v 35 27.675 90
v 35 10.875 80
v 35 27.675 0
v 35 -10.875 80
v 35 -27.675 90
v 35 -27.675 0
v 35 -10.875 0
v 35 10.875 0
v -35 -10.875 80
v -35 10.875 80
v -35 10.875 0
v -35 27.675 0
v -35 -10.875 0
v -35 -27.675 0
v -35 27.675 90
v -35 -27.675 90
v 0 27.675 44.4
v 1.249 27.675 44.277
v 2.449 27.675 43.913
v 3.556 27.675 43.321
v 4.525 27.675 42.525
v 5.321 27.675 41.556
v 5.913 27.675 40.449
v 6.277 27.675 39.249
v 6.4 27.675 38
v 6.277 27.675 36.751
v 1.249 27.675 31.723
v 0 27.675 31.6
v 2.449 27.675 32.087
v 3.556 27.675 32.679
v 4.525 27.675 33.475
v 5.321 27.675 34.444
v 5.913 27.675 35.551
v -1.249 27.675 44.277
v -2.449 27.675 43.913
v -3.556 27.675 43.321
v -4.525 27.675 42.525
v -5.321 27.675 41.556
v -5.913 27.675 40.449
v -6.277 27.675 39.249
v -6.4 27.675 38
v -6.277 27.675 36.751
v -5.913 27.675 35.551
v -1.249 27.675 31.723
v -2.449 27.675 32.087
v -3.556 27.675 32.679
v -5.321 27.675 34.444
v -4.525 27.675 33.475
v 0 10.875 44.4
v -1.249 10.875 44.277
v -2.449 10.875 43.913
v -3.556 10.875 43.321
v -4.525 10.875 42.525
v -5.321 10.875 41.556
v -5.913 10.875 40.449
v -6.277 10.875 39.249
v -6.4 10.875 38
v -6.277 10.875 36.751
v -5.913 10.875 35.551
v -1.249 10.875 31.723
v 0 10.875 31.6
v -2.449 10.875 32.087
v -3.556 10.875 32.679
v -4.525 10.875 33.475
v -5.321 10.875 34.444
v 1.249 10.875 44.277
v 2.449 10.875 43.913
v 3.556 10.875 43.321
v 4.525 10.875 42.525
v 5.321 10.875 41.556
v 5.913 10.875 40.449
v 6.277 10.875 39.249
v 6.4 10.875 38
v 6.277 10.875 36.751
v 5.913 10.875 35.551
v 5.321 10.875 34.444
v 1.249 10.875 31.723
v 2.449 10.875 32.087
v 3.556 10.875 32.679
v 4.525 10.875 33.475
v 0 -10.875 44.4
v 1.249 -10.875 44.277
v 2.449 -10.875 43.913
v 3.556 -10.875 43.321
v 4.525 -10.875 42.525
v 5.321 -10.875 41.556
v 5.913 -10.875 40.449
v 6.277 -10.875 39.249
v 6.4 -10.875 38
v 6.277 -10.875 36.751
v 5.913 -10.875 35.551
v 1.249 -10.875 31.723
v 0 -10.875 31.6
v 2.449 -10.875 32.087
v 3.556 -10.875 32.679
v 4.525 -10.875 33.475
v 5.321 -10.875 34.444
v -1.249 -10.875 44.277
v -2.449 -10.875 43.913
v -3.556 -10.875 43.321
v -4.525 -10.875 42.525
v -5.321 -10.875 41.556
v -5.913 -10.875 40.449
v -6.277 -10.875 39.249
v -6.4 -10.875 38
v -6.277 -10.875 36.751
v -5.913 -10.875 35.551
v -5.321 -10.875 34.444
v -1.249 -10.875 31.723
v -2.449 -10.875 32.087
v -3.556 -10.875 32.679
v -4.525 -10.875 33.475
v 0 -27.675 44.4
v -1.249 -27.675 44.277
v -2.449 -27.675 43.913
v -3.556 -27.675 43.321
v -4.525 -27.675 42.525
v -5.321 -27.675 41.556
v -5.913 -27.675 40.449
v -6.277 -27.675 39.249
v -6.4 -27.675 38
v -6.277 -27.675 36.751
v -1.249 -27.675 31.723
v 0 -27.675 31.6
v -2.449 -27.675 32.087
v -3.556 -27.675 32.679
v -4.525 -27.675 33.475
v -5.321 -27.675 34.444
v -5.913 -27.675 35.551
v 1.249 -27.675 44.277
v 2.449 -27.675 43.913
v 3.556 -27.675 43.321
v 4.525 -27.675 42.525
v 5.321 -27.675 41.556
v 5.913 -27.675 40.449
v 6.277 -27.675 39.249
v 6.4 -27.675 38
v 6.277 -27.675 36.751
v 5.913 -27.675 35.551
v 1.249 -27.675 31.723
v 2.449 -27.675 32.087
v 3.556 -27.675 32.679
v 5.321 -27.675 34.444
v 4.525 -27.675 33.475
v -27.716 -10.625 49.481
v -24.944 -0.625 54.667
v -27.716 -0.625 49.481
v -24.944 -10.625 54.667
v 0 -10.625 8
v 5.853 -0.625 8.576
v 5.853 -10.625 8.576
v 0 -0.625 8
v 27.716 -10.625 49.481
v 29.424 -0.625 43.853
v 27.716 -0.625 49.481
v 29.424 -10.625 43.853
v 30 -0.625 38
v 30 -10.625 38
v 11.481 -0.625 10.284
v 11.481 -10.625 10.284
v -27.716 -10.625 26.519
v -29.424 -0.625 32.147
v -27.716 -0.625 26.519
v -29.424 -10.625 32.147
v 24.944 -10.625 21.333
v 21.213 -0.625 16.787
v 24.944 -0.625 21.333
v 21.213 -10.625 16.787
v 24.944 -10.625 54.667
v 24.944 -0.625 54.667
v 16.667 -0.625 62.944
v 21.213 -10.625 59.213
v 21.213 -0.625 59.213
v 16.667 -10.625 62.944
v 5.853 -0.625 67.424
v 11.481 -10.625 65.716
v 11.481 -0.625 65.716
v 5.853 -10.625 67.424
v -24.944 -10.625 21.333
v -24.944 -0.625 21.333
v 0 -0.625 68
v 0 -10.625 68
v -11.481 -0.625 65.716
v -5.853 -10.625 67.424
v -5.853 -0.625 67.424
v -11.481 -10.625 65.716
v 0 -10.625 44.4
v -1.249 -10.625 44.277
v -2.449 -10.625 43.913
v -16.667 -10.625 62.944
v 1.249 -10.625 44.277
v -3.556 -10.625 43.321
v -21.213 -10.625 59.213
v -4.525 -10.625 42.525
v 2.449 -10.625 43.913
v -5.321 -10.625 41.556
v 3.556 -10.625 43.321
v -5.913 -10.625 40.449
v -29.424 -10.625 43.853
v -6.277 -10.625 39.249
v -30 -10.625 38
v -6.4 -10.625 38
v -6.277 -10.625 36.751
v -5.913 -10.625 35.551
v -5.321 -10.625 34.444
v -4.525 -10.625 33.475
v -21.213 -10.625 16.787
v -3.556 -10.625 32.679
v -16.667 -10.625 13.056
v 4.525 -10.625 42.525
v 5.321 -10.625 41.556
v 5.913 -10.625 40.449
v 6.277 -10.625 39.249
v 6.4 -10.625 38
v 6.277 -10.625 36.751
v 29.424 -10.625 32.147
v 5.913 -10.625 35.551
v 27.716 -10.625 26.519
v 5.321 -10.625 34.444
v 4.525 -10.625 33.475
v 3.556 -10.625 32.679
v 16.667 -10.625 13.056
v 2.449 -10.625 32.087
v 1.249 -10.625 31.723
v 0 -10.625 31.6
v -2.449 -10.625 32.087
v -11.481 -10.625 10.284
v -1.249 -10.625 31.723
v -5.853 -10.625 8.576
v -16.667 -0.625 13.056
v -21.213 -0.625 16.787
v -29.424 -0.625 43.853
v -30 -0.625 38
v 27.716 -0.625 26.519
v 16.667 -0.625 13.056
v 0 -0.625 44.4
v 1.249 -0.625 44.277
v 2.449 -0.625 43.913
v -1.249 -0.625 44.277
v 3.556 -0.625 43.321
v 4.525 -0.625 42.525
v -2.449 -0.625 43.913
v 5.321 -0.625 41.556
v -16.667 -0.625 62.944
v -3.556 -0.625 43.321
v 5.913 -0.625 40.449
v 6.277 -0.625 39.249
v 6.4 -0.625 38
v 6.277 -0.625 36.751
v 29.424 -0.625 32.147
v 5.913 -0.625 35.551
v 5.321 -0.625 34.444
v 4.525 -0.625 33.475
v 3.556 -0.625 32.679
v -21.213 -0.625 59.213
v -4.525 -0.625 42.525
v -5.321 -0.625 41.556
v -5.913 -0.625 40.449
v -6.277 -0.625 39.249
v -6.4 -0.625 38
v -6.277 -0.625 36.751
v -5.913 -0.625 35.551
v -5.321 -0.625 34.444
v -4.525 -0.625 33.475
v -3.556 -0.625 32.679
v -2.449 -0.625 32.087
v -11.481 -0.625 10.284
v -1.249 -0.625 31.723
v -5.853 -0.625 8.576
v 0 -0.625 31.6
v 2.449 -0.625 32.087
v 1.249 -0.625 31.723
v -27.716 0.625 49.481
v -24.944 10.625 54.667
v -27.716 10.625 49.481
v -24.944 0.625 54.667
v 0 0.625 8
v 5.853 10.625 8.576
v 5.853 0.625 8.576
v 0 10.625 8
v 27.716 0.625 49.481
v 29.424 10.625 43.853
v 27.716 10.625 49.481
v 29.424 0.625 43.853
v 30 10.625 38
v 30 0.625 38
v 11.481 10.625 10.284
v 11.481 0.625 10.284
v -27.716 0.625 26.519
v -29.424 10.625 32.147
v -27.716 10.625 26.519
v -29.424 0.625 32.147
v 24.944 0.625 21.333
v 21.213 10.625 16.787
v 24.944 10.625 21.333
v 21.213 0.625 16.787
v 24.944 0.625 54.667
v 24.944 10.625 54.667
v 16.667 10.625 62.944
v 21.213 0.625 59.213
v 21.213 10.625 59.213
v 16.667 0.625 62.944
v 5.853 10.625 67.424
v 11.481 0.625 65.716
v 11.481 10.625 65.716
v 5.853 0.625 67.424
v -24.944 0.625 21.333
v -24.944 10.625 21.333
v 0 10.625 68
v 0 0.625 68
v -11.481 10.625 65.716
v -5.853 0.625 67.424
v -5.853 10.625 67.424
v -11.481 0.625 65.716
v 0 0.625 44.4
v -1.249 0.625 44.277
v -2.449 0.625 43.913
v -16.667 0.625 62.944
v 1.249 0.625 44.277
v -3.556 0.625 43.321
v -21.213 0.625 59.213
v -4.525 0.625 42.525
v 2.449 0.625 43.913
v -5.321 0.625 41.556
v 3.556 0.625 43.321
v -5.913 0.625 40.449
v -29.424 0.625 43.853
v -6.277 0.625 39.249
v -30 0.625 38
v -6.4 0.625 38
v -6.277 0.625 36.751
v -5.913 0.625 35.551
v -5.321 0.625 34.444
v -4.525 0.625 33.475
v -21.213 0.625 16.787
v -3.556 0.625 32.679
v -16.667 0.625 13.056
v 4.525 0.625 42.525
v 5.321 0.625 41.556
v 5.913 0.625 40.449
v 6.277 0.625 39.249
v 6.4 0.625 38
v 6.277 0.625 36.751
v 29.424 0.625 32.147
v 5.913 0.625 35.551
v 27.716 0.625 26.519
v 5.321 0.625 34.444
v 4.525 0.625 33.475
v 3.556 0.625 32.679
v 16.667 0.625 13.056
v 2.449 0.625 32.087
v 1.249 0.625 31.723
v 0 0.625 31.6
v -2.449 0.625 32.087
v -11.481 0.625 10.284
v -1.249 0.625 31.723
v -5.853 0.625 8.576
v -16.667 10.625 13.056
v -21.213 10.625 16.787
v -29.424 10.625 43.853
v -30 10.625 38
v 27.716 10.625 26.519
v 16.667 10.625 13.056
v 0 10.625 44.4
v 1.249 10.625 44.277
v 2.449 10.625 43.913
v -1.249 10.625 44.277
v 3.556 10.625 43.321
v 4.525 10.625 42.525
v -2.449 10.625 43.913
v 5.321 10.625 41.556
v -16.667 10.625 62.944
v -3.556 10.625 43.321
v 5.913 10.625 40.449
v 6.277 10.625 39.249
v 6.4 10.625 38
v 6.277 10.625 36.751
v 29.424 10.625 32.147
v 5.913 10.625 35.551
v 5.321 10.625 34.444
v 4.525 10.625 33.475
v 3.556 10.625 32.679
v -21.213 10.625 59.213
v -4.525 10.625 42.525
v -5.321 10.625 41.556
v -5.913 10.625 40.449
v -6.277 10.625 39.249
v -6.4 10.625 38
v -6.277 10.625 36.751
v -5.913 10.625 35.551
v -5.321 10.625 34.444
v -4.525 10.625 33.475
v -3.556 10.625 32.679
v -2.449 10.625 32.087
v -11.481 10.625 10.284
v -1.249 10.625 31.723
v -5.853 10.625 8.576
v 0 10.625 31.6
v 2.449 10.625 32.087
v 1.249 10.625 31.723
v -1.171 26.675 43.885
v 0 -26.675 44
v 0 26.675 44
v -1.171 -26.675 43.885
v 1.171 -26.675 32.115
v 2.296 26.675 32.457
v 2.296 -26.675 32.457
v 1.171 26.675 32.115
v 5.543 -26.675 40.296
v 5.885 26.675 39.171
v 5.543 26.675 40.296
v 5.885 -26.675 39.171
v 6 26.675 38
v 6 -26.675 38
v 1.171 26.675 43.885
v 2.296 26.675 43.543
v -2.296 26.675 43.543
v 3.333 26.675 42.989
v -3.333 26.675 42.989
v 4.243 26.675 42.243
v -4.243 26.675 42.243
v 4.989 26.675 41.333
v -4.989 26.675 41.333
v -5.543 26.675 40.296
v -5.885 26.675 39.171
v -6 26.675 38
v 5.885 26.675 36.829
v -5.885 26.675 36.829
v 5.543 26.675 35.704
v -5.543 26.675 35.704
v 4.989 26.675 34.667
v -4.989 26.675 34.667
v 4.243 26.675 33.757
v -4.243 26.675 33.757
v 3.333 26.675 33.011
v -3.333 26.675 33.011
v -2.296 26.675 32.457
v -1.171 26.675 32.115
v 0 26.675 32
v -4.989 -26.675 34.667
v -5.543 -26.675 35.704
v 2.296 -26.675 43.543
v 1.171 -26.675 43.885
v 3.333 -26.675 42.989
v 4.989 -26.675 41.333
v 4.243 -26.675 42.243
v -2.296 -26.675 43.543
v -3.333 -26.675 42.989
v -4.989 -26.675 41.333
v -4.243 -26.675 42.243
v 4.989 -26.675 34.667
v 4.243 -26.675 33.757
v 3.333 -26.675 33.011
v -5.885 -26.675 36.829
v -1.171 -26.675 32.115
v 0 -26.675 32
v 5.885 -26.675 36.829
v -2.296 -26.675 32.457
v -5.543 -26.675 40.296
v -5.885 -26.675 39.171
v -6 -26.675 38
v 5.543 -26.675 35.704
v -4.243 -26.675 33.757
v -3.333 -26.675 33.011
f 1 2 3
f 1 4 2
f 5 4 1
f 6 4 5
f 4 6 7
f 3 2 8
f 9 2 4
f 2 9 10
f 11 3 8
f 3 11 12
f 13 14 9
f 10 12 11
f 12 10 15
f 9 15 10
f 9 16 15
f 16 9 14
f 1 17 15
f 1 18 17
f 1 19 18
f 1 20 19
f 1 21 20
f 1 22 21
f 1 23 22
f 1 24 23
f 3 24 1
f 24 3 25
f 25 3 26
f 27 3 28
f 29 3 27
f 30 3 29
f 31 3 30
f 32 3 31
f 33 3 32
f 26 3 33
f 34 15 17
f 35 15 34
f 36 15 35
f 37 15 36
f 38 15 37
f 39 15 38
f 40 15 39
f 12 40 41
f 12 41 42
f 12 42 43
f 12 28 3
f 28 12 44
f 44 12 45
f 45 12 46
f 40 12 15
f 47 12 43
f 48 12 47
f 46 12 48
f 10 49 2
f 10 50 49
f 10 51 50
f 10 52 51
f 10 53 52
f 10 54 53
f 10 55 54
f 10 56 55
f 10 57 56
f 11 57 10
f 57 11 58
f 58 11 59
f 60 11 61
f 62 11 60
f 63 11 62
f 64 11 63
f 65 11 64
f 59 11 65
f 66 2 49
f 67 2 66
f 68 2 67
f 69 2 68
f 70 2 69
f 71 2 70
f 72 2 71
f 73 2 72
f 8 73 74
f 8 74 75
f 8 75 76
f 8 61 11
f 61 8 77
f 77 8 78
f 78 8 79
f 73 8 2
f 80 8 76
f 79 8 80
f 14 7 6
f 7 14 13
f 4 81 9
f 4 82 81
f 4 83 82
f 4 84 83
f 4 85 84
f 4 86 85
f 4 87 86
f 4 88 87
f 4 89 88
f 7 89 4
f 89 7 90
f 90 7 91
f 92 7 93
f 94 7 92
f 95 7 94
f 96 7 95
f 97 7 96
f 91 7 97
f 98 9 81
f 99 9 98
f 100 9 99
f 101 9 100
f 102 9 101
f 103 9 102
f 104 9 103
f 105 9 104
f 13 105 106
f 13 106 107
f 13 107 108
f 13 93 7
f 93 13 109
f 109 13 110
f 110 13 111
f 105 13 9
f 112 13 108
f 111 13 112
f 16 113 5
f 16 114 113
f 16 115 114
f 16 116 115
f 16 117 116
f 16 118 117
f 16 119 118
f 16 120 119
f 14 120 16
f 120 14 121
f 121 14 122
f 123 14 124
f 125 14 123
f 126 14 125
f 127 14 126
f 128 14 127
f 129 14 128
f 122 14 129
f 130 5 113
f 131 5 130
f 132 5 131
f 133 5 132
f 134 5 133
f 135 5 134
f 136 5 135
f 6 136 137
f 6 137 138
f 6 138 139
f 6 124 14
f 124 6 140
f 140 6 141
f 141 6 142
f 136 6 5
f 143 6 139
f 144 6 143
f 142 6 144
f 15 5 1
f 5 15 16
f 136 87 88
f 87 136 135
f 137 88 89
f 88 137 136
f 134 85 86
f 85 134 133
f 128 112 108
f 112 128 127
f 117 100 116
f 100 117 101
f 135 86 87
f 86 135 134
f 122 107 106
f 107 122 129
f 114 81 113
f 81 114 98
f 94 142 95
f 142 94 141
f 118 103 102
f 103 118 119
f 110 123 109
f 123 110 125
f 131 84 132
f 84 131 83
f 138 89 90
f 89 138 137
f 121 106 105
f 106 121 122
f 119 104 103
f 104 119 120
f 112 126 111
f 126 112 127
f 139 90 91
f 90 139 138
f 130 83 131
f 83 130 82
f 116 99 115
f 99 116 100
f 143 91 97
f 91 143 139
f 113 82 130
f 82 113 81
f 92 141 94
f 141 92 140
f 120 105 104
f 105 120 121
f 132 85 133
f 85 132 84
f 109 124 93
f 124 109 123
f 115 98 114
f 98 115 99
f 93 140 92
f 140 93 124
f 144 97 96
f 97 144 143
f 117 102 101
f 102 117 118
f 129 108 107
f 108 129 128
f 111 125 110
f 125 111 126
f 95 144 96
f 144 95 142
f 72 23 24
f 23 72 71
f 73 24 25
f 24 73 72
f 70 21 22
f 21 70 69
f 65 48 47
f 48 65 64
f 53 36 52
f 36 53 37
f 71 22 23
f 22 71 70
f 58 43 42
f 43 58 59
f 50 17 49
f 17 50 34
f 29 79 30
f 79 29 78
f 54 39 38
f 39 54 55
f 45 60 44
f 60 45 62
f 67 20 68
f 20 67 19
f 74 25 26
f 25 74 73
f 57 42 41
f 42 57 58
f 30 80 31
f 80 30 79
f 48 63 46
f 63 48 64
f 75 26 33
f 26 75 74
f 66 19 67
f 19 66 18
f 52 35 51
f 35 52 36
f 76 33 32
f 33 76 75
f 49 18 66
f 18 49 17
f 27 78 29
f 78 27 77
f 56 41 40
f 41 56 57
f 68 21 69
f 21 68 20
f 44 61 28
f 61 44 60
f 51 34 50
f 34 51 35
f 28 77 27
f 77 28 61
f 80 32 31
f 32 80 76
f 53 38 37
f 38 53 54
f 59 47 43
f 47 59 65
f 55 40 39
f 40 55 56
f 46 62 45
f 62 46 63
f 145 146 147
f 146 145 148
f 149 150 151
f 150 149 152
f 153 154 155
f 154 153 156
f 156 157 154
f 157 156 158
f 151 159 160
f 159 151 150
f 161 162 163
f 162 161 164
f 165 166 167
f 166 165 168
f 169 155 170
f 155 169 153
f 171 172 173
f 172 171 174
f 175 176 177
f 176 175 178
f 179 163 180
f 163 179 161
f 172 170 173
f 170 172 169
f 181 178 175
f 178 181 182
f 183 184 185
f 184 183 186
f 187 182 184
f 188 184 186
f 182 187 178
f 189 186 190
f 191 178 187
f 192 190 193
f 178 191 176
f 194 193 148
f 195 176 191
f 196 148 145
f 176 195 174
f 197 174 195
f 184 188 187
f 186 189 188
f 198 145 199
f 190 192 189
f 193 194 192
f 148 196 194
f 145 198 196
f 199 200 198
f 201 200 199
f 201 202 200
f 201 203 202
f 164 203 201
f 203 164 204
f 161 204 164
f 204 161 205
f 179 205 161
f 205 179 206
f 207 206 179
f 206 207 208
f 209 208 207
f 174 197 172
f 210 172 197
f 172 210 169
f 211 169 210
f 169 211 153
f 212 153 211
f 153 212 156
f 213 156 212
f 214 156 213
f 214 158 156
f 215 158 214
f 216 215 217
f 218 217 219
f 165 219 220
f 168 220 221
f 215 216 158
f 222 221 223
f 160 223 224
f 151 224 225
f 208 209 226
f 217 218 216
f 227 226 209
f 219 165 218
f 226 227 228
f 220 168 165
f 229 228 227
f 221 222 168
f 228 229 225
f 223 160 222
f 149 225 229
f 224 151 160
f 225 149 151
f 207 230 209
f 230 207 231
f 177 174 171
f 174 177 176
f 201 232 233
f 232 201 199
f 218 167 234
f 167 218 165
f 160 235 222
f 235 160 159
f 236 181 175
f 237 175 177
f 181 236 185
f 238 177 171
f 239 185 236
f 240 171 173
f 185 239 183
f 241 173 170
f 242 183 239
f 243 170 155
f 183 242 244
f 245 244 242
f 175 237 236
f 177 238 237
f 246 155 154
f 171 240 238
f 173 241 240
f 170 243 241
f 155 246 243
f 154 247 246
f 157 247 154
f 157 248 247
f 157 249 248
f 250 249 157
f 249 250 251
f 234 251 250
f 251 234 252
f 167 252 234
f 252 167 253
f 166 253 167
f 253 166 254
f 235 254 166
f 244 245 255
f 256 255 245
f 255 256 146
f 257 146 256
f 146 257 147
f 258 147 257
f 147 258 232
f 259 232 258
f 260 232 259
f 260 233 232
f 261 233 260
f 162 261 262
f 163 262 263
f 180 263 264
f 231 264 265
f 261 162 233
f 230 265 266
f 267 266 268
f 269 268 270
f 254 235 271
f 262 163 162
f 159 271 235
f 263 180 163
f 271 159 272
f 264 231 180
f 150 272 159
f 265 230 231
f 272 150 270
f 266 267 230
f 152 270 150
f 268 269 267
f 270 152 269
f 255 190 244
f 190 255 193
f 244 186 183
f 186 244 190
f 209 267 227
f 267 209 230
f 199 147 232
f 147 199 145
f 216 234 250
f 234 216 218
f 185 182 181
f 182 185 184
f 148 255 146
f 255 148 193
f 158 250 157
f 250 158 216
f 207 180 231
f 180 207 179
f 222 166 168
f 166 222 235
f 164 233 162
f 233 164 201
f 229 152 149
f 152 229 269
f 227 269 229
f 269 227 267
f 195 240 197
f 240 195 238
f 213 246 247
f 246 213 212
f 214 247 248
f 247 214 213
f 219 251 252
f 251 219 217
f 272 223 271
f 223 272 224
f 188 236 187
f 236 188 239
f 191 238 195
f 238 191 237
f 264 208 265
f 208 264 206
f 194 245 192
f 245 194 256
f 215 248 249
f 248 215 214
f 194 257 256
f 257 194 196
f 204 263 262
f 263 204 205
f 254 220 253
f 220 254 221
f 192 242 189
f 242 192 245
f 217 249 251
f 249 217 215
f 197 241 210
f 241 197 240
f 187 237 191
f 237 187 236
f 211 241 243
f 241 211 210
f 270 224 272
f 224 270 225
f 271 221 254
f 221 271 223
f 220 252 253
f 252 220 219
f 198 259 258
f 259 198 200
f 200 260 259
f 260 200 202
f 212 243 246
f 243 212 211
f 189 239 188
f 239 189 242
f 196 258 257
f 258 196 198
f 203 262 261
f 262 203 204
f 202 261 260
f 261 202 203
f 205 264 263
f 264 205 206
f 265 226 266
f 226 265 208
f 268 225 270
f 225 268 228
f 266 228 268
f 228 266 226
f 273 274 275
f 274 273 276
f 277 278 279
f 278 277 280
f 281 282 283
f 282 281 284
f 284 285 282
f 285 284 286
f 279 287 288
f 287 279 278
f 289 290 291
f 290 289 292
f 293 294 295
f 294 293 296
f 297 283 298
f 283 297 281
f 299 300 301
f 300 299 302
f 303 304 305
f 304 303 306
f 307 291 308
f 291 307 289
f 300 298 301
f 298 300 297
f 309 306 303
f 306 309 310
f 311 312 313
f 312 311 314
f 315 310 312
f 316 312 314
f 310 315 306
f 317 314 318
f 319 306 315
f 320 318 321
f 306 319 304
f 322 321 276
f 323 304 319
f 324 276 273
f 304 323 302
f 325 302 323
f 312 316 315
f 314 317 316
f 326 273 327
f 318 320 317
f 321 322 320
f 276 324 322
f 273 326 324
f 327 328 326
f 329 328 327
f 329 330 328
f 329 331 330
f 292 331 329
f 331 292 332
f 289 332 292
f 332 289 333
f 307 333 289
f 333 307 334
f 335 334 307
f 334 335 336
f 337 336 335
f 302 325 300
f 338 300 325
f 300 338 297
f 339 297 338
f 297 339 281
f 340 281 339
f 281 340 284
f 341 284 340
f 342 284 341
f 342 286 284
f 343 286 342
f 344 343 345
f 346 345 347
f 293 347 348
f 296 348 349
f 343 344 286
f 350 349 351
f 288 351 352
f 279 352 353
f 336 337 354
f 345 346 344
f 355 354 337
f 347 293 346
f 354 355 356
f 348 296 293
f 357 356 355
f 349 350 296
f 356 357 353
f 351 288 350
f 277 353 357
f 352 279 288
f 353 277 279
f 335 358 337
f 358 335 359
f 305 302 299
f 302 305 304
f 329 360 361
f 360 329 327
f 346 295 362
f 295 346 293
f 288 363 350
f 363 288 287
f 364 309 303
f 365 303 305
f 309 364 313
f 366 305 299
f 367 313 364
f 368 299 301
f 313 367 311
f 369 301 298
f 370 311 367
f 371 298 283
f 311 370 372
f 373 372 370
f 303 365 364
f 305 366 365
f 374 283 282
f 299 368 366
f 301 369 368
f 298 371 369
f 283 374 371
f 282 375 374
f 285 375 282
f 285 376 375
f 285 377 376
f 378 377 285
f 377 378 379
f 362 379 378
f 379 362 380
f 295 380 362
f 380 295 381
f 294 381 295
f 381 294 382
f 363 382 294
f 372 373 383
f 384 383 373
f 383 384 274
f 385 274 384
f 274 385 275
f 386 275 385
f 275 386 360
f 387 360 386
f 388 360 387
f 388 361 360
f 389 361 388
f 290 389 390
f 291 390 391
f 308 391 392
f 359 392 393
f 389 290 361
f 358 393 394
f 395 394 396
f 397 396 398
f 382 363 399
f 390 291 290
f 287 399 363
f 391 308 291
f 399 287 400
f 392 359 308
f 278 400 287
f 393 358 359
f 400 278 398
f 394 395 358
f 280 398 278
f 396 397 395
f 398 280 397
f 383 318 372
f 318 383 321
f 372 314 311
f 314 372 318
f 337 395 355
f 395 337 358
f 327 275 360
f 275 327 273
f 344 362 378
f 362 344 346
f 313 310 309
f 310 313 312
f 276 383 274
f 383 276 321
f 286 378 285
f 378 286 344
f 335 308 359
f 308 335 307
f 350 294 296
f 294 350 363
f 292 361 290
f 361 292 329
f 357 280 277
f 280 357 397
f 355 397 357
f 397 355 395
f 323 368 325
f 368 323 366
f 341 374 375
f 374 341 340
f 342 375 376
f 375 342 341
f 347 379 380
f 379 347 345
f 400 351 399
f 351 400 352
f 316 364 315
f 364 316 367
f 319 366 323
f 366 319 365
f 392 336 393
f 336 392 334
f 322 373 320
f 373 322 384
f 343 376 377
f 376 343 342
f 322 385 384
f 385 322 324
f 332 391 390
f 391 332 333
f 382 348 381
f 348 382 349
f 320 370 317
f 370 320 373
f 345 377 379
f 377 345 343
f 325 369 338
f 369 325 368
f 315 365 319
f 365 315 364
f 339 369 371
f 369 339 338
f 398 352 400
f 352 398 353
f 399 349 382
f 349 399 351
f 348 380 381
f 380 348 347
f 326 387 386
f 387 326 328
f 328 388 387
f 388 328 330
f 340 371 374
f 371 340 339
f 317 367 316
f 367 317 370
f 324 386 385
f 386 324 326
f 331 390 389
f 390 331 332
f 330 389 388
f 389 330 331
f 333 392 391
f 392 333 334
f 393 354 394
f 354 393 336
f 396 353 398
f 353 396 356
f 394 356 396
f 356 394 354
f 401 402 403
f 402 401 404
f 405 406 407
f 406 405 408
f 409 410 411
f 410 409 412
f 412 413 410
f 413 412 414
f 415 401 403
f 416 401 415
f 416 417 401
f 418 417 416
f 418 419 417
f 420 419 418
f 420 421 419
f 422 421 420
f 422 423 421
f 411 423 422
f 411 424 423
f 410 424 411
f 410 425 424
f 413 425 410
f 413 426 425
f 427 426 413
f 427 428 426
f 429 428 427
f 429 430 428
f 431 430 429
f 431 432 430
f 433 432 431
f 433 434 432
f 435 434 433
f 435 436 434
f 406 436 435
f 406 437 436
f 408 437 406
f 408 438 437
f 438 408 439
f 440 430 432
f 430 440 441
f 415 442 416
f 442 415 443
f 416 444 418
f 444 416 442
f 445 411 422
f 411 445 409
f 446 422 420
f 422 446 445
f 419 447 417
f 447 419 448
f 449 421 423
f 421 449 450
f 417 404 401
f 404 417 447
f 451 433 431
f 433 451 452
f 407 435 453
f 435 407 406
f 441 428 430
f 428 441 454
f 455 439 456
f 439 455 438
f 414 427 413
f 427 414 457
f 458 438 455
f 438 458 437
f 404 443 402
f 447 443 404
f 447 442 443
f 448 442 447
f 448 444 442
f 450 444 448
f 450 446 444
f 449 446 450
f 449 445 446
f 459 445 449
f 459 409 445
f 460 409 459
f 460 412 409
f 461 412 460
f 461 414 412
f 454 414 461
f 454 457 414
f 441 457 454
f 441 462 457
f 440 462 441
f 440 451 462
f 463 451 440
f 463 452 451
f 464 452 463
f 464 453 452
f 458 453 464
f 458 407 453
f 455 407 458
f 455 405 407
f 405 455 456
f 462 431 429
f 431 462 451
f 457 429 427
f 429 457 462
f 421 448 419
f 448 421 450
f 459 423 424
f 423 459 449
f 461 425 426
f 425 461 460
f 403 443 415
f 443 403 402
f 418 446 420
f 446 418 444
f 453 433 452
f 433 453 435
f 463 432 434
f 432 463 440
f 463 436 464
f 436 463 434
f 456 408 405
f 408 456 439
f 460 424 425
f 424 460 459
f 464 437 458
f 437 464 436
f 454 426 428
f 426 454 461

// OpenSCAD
$fn = 32;

// ------------------------------------------------------------------------
// Trolley wheel set: wheels d60, fork 80 mm tall
// Every part is its own module, assembly() places every instance.
// ------------------------------------------------------------------------

// --- part 1 ---
module trolley_fork() {
  difference() {
    union() {
      translate([-35, 10.875, 0]) cube([70, 16.8, 80]);
      translate([-35, -27.675, 0]) cube([70, 16.8, 80]);
      translate([-35, -27.675, 80]) cube([70, 55.35, 10]);
    }
    translate([0, -19.275, 38]) rotate([90, 0, 0]) cylinder(h = 18.8, d = 12.8, center = true);
    translate([0, 19.275, 38]) rotate([90, 0, 0]) cylinder(h = 18.8, d = 12.8, center = true);
  }
}

// --- part 2 ---
module trolley_wheel() {
  difference() {
      translate([0, 0, 0]) cylinder(h = 10, d = 60);
      translate([0, 0, -1]) cylinder(h = 12, d = 12.8);
    }
}

// --- part 3 ---
module trolley_axle() {
  translate([0, 0, -26.675]) cylinder(h = 53.35, d = 12);
}

// --- assembly ---
module assembly() {
  color([0.80, 0.24, 0.20]) translate([0, 0, 0]) rotate([0, 0, 0]) trolley_fork();
  color([0.20, 0.45, 0.75]) translate([0, -0.625, 38]) rotate([90, 0, 0]) trolley_wheel();
  color([0.25, 0.62, 0.32]) translate([0, 10.625, 38]) rotate([90, 0, 0]) trolley_wheel();
  color([0.92, 0.70, 0.18]) translate([0, 0, 38]) rotate([90, 0, 0]) trolley_axle();
}

assembly();
